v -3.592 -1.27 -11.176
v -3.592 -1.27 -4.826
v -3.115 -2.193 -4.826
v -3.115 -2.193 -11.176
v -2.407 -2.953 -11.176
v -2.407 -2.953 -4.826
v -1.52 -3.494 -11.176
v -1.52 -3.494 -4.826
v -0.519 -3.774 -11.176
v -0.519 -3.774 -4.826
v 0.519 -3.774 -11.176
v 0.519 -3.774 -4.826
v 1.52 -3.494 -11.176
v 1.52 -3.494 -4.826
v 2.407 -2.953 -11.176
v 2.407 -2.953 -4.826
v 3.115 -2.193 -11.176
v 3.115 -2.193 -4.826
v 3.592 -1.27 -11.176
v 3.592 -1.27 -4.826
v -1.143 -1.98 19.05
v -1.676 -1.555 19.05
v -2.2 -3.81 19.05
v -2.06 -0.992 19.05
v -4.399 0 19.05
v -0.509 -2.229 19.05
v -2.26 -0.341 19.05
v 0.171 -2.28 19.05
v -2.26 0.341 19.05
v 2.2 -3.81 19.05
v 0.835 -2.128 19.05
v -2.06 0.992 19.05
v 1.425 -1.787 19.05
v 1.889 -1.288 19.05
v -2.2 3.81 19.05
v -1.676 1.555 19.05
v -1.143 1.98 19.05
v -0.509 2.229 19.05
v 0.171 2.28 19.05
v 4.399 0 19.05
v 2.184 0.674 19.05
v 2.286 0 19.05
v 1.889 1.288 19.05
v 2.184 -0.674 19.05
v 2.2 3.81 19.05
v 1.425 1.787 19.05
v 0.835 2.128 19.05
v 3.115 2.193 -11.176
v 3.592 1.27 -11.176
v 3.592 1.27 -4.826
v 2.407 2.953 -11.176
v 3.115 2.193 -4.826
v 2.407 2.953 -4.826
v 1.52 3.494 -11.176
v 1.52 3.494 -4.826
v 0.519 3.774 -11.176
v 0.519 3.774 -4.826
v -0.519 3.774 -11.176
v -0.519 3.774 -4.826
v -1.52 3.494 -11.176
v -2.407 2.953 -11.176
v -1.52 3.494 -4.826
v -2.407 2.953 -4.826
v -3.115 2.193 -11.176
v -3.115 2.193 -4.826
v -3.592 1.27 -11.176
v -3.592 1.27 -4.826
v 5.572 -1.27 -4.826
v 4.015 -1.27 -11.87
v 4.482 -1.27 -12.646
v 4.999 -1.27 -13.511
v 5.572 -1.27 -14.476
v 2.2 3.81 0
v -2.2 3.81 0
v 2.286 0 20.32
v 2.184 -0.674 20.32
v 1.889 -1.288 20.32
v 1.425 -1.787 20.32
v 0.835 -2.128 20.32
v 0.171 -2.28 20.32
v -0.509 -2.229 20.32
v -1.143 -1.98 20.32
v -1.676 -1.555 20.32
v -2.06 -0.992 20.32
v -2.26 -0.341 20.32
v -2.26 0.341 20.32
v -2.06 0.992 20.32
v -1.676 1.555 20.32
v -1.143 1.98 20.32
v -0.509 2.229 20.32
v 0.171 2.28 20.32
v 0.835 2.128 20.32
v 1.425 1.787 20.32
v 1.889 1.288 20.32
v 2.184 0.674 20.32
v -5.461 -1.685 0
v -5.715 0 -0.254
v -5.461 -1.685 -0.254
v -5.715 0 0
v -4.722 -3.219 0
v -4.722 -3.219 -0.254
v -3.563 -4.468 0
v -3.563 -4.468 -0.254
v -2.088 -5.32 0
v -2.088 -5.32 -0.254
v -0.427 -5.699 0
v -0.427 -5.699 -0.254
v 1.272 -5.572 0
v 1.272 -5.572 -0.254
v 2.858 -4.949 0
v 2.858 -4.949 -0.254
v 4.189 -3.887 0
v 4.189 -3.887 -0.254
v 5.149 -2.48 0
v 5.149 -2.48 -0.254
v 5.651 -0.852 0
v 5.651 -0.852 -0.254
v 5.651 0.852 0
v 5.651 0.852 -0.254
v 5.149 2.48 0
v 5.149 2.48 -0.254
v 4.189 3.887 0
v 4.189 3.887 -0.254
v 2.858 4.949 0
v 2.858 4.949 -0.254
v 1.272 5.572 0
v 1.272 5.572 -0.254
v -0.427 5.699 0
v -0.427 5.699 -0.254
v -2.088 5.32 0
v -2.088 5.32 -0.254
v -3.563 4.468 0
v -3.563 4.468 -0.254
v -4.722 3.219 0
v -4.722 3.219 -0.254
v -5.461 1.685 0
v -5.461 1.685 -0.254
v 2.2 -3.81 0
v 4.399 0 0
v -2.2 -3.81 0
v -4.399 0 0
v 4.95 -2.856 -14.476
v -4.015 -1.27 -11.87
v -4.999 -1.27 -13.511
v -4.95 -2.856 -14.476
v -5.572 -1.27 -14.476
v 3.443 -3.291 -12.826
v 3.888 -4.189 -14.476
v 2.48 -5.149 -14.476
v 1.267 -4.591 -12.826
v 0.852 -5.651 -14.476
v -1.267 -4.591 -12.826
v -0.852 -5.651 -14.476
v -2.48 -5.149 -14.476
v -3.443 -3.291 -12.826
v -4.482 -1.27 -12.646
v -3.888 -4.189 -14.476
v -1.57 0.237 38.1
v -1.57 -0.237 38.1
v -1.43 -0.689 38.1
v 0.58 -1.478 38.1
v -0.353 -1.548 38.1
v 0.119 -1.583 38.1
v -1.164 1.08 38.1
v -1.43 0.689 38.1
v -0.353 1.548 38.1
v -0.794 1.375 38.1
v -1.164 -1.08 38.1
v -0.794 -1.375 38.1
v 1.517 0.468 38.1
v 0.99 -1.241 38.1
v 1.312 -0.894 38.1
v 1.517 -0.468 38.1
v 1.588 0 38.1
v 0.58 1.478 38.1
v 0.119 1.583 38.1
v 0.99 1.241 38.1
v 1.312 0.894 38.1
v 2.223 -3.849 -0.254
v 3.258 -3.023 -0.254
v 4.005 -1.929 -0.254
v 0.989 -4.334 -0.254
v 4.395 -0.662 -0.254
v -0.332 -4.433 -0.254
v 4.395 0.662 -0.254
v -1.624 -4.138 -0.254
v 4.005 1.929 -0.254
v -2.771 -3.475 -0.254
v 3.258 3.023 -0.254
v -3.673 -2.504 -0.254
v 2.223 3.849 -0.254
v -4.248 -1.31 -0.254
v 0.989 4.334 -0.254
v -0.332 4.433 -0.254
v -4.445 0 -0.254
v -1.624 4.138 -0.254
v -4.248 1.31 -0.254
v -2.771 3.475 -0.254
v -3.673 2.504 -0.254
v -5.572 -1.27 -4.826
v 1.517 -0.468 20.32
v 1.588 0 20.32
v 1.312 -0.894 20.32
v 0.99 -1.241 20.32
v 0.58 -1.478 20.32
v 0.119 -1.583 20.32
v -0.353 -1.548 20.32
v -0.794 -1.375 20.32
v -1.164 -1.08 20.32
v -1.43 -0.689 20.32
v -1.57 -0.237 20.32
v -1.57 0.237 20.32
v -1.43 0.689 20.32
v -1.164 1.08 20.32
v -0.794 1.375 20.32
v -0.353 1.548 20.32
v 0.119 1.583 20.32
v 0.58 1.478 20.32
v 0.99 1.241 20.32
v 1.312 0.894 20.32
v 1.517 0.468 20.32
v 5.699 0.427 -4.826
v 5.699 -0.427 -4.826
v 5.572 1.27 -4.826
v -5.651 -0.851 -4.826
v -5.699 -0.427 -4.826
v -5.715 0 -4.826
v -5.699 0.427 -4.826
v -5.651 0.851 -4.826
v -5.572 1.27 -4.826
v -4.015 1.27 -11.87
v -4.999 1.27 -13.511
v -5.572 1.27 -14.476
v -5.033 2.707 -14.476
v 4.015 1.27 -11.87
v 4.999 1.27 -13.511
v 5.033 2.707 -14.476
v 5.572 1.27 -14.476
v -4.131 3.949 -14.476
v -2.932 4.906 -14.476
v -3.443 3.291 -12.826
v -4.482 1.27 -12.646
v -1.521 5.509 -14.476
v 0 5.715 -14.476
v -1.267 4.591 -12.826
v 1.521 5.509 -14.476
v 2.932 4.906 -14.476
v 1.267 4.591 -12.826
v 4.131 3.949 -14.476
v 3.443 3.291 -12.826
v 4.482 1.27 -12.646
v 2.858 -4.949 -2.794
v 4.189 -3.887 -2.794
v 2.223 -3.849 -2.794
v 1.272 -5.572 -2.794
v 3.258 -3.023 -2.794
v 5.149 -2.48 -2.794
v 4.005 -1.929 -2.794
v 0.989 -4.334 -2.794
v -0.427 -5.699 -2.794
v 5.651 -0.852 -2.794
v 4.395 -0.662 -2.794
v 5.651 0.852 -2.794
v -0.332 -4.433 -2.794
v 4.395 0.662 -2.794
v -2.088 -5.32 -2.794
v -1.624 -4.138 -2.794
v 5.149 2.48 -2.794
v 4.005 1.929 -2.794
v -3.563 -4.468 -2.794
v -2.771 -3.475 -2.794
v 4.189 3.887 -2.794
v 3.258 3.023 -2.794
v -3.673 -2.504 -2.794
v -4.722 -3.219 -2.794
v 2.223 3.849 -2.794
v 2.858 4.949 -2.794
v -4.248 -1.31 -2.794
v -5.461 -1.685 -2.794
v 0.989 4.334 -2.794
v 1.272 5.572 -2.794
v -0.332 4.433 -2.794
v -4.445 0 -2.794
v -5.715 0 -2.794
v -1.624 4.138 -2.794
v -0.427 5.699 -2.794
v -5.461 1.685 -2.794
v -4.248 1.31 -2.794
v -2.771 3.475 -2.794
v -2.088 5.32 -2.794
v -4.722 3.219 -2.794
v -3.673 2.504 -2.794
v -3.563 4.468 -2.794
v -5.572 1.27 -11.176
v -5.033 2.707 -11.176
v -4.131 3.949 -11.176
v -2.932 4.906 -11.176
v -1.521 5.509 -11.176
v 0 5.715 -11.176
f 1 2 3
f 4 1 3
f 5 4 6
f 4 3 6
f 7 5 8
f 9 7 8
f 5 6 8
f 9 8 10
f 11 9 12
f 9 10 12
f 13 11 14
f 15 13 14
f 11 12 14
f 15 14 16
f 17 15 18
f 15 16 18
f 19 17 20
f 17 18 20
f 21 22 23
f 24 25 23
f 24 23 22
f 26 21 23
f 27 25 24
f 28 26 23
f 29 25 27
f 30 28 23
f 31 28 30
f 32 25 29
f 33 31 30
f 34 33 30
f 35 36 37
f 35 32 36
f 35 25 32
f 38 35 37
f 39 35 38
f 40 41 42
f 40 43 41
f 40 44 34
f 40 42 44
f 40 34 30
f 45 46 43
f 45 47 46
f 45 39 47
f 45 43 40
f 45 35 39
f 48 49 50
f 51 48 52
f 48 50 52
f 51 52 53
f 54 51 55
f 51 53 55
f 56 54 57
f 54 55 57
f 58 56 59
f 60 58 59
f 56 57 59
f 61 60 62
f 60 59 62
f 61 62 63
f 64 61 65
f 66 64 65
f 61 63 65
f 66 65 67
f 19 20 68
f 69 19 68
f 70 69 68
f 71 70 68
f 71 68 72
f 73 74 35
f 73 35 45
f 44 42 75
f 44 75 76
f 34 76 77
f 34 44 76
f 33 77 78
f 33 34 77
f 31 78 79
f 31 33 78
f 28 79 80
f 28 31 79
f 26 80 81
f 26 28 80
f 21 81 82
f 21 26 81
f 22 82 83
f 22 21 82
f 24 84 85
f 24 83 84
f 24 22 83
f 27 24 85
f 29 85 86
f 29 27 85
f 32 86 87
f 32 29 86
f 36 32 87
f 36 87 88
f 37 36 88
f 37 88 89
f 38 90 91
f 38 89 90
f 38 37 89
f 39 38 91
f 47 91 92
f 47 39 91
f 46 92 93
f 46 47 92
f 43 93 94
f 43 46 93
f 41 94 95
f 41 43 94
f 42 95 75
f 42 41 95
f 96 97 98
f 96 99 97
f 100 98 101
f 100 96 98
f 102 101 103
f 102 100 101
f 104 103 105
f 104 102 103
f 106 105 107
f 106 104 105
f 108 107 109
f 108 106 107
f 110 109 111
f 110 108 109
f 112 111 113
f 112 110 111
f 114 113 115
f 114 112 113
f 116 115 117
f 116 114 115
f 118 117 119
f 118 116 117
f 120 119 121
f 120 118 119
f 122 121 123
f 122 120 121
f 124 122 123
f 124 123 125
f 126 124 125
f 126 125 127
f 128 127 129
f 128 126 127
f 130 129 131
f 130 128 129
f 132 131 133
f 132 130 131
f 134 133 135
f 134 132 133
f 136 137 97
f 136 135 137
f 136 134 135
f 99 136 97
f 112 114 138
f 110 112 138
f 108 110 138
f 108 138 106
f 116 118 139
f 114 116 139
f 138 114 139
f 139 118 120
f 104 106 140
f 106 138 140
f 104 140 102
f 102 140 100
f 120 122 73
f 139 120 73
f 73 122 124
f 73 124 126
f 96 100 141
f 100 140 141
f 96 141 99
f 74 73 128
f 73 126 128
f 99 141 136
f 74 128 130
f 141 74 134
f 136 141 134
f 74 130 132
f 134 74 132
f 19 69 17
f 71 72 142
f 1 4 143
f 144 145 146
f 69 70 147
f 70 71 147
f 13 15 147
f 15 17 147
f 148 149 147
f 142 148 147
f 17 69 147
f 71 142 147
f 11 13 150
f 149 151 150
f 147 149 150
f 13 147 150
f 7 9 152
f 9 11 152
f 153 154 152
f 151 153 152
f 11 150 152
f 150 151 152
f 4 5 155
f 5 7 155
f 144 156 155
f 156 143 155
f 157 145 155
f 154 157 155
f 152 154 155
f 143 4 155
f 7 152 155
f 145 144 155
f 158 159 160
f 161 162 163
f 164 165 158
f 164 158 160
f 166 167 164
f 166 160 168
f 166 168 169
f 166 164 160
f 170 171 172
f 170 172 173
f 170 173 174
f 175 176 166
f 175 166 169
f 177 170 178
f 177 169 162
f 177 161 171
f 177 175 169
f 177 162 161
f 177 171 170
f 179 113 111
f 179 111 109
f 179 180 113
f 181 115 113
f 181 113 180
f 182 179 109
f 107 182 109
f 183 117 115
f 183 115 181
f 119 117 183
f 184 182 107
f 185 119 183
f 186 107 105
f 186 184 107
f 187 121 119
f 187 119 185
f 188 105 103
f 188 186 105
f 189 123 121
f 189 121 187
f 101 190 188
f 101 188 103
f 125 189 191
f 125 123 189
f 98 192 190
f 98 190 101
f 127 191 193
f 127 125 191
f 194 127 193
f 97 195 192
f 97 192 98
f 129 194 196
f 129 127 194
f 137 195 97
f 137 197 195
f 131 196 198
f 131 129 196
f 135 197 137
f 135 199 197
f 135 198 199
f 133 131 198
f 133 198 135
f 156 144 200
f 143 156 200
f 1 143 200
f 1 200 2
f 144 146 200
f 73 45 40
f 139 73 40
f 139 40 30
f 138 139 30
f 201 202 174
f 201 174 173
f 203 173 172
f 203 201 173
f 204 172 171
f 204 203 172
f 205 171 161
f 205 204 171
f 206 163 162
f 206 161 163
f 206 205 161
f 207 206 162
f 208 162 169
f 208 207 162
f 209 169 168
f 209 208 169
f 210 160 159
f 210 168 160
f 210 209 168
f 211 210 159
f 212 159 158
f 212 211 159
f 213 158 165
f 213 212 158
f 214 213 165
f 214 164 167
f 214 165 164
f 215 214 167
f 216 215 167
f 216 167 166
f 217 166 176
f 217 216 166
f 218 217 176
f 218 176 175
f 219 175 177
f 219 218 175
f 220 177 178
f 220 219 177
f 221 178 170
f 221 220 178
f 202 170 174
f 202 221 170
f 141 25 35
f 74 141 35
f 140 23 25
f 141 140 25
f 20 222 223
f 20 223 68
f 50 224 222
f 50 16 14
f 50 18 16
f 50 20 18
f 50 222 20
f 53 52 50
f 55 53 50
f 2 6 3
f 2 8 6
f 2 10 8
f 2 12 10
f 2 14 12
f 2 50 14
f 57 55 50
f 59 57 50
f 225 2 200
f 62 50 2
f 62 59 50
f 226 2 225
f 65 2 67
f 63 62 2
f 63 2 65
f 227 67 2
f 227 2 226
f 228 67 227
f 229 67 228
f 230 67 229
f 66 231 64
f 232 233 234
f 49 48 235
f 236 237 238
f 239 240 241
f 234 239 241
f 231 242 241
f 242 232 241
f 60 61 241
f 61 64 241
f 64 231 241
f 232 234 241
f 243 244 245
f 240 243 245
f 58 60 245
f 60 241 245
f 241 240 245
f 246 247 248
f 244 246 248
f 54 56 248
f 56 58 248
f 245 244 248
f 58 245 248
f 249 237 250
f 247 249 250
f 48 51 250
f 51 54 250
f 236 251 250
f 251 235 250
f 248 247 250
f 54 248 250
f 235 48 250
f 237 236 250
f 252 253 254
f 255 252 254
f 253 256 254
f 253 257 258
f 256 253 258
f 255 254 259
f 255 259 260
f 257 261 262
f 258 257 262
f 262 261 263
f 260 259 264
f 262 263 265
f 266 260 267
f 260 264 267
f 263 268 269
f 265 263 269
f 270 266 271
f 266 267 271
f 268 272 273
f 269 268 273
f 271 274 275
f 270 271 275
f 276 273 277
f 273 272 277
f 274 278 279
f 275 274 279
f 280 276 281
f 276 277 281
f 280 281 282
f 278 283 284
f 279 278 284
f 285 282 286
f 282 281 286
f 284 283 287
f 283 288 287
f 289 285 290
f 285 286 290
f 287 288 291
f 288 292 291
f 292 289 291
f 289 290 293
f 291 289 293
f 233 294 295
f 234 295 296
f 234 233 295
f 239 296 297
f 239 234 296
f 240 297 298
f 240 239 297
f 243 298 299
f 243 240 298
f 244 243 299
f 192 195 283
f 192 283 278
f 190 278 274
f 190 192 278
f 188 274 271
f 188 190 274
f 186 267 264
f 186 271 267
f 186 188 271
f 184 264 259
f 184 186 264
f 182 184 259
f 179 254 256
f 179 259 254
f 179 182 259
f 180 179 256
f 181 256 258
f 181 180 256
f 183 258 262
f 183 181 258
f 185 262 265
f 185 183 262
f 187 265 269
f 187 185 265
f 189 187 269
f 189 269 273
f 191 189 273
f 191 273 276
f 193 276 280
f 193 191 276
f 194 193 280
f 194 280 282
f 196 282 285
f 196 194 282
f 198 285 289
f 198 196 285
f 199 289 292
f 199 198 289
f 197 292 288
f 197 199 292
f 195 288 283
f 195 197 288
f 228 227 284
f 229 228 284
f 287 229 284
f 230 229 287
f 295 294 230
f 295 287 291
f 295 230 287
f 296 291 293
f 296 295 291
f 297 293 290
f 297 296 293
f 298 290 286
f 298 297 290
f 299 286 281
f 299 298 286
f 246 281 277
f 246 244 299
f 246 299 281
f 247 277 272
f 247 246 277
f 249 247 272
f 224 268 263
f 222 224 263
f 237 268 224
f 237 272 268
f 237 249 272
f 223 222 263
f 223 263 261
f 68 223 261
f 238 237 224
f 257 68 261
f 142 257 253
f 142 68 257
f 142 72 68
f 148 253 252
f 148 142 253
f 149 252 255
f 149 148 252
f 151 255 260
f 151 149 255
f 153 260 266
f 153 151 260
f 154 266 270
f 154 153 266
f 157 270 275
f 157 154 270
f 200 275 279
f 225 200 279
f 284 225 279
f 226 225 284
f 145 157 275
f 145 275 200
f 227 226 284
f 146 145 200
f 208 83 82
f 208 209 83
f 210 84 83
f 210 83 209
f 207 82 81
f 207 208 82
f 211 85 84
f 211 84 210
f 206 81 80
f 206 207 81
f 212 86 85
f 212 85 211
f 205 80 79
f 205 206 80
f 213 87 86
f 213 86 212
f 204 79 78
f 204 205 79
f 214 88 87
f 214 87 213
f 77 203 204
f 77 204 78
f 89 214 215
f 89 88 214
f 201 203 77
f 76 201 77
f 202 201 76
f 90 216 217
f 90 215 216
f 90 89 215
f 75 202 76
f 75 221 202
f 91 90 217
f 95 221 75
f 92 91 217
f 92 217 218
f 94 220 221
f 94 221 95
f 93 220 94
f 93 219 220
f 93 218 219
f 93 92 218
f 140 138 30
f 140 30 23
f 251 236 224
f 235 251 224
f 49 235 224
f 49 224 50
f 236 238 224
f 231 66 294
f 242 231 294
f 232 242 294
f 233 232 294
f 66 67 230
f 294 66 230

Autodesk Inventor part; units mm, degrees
ref_plane "YZ Plane" through (0, 0, 0) normal (1, 0, 0) x (0, 1, 0)
ref_plane "XZ Plane" through (0, 0, 0) normal (0, 1, 0) x (-1, 0, 0)
ref_plane "XY Plane" through (0, 0, 0) normal (0, 0, 1) x (1, 0, 0)
sketch "Sketch1" plane through (0, 0, 0) normal (0, 0, 1) x (1, 0, 0)
  line L0 (2.1997, -3.81) -> (-2.1997, -3.81)
  line L1 (-2.1997, -3.81) -> (-4.3994, 0)
  line L2 (-4.3994, 0) -> (-2.1997, 3.81)
  line L3 (-2.1997, 3.81) -> (2.1997, 3.81)
  line L4 (2.1997, 3.81) -> (4.3994, 0)
  line L5 (4.3994, 0) -> (2.1997, -3.81)
  point P0 (0, 0)
  point P1 (0, 0)
  dimension "d0" = 7.62
extrude "Extrusion1" add sketch "Sketch1" along normal blind 19.05
sketch "Sketch2" plane through (0, 0, 19.05) normal (0, 0, 1) x (1, 0, 0)
  circle A0 centre (0, 0) radius 2.286
  dimension "d3" = 4.572
extrude "Extrusion2" add sketch "Sketch2" along normal blind 1.27
sketch "Sketch3" plane through (0, 0, 20.32) normal (0, 0, 1) x (1, 0, 0)
  circle A0 centre (0, 0) radius 2.286 projected
  circle A1 centre (0, 0) radius 1.5875
  dimension "d6" = 3.175
extrude "Extrusion3" add sketch "Sketch3" along normal blind 17.78 contours A1
thread "Thread1" size "5-40 UNC" class "2A" standard "ANSI Unified Screw Threads" length 8.89
sketch "Sketch4" plane through (0, 0, 0) normal (0, 0, -1) x (-1, 0, 0)
  circle A0 centre (0, 0) radius 5.715
  dimension "d11" = 11.43
extrude "Extrusion4" add sketch "Sketch4" along normal blind 0.254
sketch "Sketch5" plane through (0, 0, -0.254) normal (0, 0, -1) x (-1, 0, 0)
  circle A0 centre (0, 0) radius 5.715 projected
  circle A1 centre (0, 0) radius 4.445
  dimension "d14" = 8.89
extrude "Extrusion5" add sketch "Sketch5" along normal blind 2.54 contours A1
sketch "Sketch6" plane through (0, 0, -2.794) normal (0, 0, -1) x (-1, 0, 0)
  circle A0 centre (0, 0) radius 4.445 projected
  circle A1 centre (0, 0) radius 5.715
  dimension "d17" = 11.43
extrude "Extrusion6" add sketch "Sketch6" along normal blind 2.032 contours A0 | A1
sketch "Sketch7" plane through (0, 0, -4.826) normal (0, 0, -1) x (-1, 0, 0)
  circle A0 centre (0, 0) radius 5.715 projected
  circle A1 centre (0, 0) radius 5.715 projected
  line L0 (0, 6.5237) -> (0, -6.5237) construction
  arc A2 (-3.5921, -1.27) -> (3.5921, -1.27) centre (0, 0) ccw
  arc A3 (3.5921, 1.27) -> (-3.5921, 1.27) centre (0, 0) ccw
  arc A4 (-5.5721, -1.27) -> (5.5721, -1.27) centre (0, 0) ccw
  arc A5 (5.5721, 1.27) -> (-5.5721, 1.27) centre (0, 0) ccw
  arc A6 (-3.5921, 1.27) -> (-3.5921, -1.27) centre (0, 0) ccw
  arc A7 (-5.5721, 1.27) -> (-5.5721, -1.27) centre (0, 0) ccw
  arc A8 (3.5921, -1.27) -> (3.5921, 1.27) centre (0, 0) ccw
  arc A9 (5.5721, -1.27) -> (5.5721, 1.27) centre (0, 0) ccw
  point P0 (-5.715, 1.27)
  point P1 (-5.715, -1.27)
  point P2 (5.715, 1.27)
  point P3 (5.715, -1.27)
extrude "Extrusion8" add sketch "Sketch7" along normal blind 6.35
sketch "Sketch13" plane through (0, 0, 0) normal (1, 0, 0) x (0, 1, 0)
  line L0 (2.286, 20.32) -> (2.286, 19.05) projected
  line L1 (2.286, 19.05) -> (3.81, 19.05) projected
  line L2 (3.81, 19.05) -> (3.81, 0) projected
  line L3 (3.81, 0) -> (5.715, 0) projected
  line L4 (5.715, 0) -> (5.715, -0.254) projected
  line L5 (5.715, -0.254) -> (4.445, -0.254) projected
  line L6 (4.445, -0.254) -> (4.445, -2.794) projected
  line L7 (4.445, -2.794) -> (5.715, -2.794) projected
  line L8 (5.715, -2.794) -> (5.715, -11.176) projected
  line L9 (5.715, -11.176) -> (3.81, -11.176) projected
  line L10 (3.81, -11.176) -> (3.81, -4.826) projected
  line L11 (3.81, -4.826) -> (-3.81, -4.826) projected
  line L12 (-3.81, -4.826) -> (-3.81, -11.176) projected
  line L13 (-3.81, -11.176) -> (-5.715, -11.176) projected
  line L14 (-5.715, -11.176) -> (-5.715, -2.794) projected
  line L15 (-5.715, -2.794) -> (-4.445, -2.794) projected
  line L16 (-4.445, -2.794) -> (-4.445, -0.254) projected
  line L17 (-4.445, -0.254) -> (-5.715, -0.254) projected
  line L18 (-5.715, -0.254) -> (-5.715, 0) projected
  line L19 (-5.715, 0) -> (-3.81, 0) projected
  line L20 (-3.81, 0) -> (-3.81, 19.05) projected
  line L21 (-3.81, 19.05) -> (-2.286, 19.05) projected
  line L22 (-2.286, 19.05) -> (-2.286, 20.32) projected
  line L23 (-2.286, 20.32) -> (-1.5875, 20.32) projected
  line L24 (-1.5875, 20.32) -> (-1.5875, 38.1) projected
  line L25 (-1.5875, 38.1) -> (1.5875, 38.1) projected
  line L26 (1.5875, 38.1) -> (1.5875, 20.32) projected
  line L27 (1.5875, 20.32) -> (2.286, 20.32) projected
  line L28 (5.715, -11.176) -> (5.715, -14.4756)
  line L29 (5.715, -14.4756) -> (3.81, -11.176)
  line L30 (3.81, -11.176) -> (5.715, -11.176)
  line L31 (0, -24.9907) -> (0, 48.6151) projected
  point P0 (0, 0)
  dimension "d32" = 30
revolve "Revolution1" add sketch "Sketch13" angle 360 about axis through (0, 0, -10) along (0, 0, 1) contours L9 L28 L29
sketch "Sketch16" plane through (0, 0, -4.826) normal (0, 0, -1) x (-1, 0, 0)
  circle A0 centre (0, 0) radius 3.81 projected
  line L0 (-5.5721, 1.27) -> (-3.5921, 1.27)
  line L1 (-3.5921, -1.27) -> (-5.5721, -1.27)
  arc A1 (-3.5921, 1.27) -> (-3.5921, -1.27) centre (0, 0) ccw
  arc A2 (-5.5721, 1.27) -> (-5.5721, -1.27) centre (0, 0) ccw
  circle A3 centre (0, 0) radius 5.715 projected
  line L2 (5.5721, -1.27) -> (3.5921, -1.27)
  line L3 (3.5921, 1.27) -> (5.5721, 1.27)
  arc A4 (3.5921, -1.27) -> (3.5921, 1.27) centre (0, 0) ccw
  arc A5 (5.5721, -1.27) -> (5.5721, 1.27) centre (0, 0) ccw
  dimension "d47" = 360
extrude "Extrusion9" cut sketch "Sketch16" along normal up to surface contours A0 L3 A3 L2 | A0 L1 A2 L0
properties part number "Shaft"
